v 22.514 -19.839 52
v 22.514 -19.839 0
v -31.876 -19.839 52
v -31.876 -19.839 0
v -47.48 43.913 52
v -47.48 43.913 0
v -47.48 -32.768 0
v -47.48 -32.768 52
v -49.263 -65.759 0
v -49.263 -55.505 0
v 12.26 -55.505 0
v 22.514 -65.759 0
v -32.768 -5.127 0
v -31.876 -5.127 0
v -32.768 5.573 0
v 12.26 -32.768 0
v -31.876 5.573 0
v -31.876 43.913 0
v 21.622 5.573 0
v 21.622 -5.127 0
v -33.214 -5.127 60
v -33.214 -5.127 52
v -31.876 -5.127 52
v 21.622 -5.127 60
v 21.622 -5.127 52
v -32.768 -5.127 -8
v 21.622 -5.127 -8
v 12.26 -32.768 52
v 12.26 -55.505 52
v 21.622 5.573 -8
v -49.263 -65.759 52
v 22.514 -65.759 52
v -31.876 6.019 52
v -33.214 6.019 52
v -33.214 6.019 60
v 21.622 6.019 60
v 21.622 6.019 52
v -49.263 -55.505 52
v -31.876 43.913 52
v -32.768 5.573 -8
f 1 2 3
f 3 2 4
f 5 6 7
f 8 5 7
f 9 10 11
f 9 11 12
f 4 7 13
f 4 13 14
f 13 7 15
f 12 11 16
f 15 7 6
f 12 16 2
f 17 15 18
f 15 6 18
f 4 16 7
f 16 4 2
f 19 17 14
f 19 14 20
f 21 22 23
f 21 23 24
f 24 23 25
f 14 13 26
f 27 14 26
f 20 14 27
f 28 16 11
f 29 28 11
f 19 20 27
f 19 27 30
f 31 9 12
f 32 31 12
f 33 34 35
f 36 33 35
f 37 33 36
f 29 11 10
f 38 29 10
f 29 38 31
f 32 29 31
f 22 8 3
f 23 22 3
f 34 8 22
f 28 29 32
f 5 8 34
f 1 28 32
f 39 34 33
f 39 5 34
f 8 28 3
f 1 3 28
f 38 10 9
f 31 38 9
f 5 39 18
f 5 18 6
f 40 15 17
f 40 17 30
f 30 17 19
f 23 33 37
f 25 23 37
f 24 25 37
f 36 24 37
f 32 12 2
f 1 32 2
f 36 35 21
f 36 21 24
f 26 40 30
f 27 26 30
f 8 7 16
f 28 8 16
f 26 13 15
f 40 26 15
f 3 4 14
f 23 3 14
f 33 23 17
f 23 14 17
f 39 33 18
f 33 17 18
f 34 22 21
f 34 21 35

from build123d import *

# Parameters (mm, degrees)
F1_DEPTH = 52
F3_W     = 54.390293
F3_H     = 10.69973
F4_DEPTH = 8
F5_W     = 54.836117
F5_H     = 11.145552
F6_DEPTH = 8


with BuildPart() as f1:
    # F0 (on Top) → F1 (new body)
    with BuildSketch(Plane.XY):
        Polygon((-31.876273, 43.913472), (-47.480047, 43.913472), (-47.480047, -32.767925), (-43.021828, -32.767925), (12.260112, -32.767925), (12.260112, -55.504851), (-49.263336, -55.504851), (-49.263336, -65.758757), (-43.467648, -65.758757), (22.514023, -65.758757), (22.514023, -32.767925), (22.514023, -19.839084), (-31.876273, -19.839084), align=None)
    extrude(amount=F1_DEPTH)

    # F3 (on Top) → F4 (join)
    with BuildSketch(Plane.XY):
        with Locations((-5.572776, 0.22291)):
            Rectangle(F3_W, F3_H)
    extrude(amount=-F4_DEPTH)

    # F5 (on offset) → F6 (join)
    with BuildSketch(Plane.XY.offset(52)):
        with Locations((-5.795691, 0.445822)):
            Rectangle(F5_W, F5_H)
    extrude(amount=F6_DEPTH)


solid = f1.part
